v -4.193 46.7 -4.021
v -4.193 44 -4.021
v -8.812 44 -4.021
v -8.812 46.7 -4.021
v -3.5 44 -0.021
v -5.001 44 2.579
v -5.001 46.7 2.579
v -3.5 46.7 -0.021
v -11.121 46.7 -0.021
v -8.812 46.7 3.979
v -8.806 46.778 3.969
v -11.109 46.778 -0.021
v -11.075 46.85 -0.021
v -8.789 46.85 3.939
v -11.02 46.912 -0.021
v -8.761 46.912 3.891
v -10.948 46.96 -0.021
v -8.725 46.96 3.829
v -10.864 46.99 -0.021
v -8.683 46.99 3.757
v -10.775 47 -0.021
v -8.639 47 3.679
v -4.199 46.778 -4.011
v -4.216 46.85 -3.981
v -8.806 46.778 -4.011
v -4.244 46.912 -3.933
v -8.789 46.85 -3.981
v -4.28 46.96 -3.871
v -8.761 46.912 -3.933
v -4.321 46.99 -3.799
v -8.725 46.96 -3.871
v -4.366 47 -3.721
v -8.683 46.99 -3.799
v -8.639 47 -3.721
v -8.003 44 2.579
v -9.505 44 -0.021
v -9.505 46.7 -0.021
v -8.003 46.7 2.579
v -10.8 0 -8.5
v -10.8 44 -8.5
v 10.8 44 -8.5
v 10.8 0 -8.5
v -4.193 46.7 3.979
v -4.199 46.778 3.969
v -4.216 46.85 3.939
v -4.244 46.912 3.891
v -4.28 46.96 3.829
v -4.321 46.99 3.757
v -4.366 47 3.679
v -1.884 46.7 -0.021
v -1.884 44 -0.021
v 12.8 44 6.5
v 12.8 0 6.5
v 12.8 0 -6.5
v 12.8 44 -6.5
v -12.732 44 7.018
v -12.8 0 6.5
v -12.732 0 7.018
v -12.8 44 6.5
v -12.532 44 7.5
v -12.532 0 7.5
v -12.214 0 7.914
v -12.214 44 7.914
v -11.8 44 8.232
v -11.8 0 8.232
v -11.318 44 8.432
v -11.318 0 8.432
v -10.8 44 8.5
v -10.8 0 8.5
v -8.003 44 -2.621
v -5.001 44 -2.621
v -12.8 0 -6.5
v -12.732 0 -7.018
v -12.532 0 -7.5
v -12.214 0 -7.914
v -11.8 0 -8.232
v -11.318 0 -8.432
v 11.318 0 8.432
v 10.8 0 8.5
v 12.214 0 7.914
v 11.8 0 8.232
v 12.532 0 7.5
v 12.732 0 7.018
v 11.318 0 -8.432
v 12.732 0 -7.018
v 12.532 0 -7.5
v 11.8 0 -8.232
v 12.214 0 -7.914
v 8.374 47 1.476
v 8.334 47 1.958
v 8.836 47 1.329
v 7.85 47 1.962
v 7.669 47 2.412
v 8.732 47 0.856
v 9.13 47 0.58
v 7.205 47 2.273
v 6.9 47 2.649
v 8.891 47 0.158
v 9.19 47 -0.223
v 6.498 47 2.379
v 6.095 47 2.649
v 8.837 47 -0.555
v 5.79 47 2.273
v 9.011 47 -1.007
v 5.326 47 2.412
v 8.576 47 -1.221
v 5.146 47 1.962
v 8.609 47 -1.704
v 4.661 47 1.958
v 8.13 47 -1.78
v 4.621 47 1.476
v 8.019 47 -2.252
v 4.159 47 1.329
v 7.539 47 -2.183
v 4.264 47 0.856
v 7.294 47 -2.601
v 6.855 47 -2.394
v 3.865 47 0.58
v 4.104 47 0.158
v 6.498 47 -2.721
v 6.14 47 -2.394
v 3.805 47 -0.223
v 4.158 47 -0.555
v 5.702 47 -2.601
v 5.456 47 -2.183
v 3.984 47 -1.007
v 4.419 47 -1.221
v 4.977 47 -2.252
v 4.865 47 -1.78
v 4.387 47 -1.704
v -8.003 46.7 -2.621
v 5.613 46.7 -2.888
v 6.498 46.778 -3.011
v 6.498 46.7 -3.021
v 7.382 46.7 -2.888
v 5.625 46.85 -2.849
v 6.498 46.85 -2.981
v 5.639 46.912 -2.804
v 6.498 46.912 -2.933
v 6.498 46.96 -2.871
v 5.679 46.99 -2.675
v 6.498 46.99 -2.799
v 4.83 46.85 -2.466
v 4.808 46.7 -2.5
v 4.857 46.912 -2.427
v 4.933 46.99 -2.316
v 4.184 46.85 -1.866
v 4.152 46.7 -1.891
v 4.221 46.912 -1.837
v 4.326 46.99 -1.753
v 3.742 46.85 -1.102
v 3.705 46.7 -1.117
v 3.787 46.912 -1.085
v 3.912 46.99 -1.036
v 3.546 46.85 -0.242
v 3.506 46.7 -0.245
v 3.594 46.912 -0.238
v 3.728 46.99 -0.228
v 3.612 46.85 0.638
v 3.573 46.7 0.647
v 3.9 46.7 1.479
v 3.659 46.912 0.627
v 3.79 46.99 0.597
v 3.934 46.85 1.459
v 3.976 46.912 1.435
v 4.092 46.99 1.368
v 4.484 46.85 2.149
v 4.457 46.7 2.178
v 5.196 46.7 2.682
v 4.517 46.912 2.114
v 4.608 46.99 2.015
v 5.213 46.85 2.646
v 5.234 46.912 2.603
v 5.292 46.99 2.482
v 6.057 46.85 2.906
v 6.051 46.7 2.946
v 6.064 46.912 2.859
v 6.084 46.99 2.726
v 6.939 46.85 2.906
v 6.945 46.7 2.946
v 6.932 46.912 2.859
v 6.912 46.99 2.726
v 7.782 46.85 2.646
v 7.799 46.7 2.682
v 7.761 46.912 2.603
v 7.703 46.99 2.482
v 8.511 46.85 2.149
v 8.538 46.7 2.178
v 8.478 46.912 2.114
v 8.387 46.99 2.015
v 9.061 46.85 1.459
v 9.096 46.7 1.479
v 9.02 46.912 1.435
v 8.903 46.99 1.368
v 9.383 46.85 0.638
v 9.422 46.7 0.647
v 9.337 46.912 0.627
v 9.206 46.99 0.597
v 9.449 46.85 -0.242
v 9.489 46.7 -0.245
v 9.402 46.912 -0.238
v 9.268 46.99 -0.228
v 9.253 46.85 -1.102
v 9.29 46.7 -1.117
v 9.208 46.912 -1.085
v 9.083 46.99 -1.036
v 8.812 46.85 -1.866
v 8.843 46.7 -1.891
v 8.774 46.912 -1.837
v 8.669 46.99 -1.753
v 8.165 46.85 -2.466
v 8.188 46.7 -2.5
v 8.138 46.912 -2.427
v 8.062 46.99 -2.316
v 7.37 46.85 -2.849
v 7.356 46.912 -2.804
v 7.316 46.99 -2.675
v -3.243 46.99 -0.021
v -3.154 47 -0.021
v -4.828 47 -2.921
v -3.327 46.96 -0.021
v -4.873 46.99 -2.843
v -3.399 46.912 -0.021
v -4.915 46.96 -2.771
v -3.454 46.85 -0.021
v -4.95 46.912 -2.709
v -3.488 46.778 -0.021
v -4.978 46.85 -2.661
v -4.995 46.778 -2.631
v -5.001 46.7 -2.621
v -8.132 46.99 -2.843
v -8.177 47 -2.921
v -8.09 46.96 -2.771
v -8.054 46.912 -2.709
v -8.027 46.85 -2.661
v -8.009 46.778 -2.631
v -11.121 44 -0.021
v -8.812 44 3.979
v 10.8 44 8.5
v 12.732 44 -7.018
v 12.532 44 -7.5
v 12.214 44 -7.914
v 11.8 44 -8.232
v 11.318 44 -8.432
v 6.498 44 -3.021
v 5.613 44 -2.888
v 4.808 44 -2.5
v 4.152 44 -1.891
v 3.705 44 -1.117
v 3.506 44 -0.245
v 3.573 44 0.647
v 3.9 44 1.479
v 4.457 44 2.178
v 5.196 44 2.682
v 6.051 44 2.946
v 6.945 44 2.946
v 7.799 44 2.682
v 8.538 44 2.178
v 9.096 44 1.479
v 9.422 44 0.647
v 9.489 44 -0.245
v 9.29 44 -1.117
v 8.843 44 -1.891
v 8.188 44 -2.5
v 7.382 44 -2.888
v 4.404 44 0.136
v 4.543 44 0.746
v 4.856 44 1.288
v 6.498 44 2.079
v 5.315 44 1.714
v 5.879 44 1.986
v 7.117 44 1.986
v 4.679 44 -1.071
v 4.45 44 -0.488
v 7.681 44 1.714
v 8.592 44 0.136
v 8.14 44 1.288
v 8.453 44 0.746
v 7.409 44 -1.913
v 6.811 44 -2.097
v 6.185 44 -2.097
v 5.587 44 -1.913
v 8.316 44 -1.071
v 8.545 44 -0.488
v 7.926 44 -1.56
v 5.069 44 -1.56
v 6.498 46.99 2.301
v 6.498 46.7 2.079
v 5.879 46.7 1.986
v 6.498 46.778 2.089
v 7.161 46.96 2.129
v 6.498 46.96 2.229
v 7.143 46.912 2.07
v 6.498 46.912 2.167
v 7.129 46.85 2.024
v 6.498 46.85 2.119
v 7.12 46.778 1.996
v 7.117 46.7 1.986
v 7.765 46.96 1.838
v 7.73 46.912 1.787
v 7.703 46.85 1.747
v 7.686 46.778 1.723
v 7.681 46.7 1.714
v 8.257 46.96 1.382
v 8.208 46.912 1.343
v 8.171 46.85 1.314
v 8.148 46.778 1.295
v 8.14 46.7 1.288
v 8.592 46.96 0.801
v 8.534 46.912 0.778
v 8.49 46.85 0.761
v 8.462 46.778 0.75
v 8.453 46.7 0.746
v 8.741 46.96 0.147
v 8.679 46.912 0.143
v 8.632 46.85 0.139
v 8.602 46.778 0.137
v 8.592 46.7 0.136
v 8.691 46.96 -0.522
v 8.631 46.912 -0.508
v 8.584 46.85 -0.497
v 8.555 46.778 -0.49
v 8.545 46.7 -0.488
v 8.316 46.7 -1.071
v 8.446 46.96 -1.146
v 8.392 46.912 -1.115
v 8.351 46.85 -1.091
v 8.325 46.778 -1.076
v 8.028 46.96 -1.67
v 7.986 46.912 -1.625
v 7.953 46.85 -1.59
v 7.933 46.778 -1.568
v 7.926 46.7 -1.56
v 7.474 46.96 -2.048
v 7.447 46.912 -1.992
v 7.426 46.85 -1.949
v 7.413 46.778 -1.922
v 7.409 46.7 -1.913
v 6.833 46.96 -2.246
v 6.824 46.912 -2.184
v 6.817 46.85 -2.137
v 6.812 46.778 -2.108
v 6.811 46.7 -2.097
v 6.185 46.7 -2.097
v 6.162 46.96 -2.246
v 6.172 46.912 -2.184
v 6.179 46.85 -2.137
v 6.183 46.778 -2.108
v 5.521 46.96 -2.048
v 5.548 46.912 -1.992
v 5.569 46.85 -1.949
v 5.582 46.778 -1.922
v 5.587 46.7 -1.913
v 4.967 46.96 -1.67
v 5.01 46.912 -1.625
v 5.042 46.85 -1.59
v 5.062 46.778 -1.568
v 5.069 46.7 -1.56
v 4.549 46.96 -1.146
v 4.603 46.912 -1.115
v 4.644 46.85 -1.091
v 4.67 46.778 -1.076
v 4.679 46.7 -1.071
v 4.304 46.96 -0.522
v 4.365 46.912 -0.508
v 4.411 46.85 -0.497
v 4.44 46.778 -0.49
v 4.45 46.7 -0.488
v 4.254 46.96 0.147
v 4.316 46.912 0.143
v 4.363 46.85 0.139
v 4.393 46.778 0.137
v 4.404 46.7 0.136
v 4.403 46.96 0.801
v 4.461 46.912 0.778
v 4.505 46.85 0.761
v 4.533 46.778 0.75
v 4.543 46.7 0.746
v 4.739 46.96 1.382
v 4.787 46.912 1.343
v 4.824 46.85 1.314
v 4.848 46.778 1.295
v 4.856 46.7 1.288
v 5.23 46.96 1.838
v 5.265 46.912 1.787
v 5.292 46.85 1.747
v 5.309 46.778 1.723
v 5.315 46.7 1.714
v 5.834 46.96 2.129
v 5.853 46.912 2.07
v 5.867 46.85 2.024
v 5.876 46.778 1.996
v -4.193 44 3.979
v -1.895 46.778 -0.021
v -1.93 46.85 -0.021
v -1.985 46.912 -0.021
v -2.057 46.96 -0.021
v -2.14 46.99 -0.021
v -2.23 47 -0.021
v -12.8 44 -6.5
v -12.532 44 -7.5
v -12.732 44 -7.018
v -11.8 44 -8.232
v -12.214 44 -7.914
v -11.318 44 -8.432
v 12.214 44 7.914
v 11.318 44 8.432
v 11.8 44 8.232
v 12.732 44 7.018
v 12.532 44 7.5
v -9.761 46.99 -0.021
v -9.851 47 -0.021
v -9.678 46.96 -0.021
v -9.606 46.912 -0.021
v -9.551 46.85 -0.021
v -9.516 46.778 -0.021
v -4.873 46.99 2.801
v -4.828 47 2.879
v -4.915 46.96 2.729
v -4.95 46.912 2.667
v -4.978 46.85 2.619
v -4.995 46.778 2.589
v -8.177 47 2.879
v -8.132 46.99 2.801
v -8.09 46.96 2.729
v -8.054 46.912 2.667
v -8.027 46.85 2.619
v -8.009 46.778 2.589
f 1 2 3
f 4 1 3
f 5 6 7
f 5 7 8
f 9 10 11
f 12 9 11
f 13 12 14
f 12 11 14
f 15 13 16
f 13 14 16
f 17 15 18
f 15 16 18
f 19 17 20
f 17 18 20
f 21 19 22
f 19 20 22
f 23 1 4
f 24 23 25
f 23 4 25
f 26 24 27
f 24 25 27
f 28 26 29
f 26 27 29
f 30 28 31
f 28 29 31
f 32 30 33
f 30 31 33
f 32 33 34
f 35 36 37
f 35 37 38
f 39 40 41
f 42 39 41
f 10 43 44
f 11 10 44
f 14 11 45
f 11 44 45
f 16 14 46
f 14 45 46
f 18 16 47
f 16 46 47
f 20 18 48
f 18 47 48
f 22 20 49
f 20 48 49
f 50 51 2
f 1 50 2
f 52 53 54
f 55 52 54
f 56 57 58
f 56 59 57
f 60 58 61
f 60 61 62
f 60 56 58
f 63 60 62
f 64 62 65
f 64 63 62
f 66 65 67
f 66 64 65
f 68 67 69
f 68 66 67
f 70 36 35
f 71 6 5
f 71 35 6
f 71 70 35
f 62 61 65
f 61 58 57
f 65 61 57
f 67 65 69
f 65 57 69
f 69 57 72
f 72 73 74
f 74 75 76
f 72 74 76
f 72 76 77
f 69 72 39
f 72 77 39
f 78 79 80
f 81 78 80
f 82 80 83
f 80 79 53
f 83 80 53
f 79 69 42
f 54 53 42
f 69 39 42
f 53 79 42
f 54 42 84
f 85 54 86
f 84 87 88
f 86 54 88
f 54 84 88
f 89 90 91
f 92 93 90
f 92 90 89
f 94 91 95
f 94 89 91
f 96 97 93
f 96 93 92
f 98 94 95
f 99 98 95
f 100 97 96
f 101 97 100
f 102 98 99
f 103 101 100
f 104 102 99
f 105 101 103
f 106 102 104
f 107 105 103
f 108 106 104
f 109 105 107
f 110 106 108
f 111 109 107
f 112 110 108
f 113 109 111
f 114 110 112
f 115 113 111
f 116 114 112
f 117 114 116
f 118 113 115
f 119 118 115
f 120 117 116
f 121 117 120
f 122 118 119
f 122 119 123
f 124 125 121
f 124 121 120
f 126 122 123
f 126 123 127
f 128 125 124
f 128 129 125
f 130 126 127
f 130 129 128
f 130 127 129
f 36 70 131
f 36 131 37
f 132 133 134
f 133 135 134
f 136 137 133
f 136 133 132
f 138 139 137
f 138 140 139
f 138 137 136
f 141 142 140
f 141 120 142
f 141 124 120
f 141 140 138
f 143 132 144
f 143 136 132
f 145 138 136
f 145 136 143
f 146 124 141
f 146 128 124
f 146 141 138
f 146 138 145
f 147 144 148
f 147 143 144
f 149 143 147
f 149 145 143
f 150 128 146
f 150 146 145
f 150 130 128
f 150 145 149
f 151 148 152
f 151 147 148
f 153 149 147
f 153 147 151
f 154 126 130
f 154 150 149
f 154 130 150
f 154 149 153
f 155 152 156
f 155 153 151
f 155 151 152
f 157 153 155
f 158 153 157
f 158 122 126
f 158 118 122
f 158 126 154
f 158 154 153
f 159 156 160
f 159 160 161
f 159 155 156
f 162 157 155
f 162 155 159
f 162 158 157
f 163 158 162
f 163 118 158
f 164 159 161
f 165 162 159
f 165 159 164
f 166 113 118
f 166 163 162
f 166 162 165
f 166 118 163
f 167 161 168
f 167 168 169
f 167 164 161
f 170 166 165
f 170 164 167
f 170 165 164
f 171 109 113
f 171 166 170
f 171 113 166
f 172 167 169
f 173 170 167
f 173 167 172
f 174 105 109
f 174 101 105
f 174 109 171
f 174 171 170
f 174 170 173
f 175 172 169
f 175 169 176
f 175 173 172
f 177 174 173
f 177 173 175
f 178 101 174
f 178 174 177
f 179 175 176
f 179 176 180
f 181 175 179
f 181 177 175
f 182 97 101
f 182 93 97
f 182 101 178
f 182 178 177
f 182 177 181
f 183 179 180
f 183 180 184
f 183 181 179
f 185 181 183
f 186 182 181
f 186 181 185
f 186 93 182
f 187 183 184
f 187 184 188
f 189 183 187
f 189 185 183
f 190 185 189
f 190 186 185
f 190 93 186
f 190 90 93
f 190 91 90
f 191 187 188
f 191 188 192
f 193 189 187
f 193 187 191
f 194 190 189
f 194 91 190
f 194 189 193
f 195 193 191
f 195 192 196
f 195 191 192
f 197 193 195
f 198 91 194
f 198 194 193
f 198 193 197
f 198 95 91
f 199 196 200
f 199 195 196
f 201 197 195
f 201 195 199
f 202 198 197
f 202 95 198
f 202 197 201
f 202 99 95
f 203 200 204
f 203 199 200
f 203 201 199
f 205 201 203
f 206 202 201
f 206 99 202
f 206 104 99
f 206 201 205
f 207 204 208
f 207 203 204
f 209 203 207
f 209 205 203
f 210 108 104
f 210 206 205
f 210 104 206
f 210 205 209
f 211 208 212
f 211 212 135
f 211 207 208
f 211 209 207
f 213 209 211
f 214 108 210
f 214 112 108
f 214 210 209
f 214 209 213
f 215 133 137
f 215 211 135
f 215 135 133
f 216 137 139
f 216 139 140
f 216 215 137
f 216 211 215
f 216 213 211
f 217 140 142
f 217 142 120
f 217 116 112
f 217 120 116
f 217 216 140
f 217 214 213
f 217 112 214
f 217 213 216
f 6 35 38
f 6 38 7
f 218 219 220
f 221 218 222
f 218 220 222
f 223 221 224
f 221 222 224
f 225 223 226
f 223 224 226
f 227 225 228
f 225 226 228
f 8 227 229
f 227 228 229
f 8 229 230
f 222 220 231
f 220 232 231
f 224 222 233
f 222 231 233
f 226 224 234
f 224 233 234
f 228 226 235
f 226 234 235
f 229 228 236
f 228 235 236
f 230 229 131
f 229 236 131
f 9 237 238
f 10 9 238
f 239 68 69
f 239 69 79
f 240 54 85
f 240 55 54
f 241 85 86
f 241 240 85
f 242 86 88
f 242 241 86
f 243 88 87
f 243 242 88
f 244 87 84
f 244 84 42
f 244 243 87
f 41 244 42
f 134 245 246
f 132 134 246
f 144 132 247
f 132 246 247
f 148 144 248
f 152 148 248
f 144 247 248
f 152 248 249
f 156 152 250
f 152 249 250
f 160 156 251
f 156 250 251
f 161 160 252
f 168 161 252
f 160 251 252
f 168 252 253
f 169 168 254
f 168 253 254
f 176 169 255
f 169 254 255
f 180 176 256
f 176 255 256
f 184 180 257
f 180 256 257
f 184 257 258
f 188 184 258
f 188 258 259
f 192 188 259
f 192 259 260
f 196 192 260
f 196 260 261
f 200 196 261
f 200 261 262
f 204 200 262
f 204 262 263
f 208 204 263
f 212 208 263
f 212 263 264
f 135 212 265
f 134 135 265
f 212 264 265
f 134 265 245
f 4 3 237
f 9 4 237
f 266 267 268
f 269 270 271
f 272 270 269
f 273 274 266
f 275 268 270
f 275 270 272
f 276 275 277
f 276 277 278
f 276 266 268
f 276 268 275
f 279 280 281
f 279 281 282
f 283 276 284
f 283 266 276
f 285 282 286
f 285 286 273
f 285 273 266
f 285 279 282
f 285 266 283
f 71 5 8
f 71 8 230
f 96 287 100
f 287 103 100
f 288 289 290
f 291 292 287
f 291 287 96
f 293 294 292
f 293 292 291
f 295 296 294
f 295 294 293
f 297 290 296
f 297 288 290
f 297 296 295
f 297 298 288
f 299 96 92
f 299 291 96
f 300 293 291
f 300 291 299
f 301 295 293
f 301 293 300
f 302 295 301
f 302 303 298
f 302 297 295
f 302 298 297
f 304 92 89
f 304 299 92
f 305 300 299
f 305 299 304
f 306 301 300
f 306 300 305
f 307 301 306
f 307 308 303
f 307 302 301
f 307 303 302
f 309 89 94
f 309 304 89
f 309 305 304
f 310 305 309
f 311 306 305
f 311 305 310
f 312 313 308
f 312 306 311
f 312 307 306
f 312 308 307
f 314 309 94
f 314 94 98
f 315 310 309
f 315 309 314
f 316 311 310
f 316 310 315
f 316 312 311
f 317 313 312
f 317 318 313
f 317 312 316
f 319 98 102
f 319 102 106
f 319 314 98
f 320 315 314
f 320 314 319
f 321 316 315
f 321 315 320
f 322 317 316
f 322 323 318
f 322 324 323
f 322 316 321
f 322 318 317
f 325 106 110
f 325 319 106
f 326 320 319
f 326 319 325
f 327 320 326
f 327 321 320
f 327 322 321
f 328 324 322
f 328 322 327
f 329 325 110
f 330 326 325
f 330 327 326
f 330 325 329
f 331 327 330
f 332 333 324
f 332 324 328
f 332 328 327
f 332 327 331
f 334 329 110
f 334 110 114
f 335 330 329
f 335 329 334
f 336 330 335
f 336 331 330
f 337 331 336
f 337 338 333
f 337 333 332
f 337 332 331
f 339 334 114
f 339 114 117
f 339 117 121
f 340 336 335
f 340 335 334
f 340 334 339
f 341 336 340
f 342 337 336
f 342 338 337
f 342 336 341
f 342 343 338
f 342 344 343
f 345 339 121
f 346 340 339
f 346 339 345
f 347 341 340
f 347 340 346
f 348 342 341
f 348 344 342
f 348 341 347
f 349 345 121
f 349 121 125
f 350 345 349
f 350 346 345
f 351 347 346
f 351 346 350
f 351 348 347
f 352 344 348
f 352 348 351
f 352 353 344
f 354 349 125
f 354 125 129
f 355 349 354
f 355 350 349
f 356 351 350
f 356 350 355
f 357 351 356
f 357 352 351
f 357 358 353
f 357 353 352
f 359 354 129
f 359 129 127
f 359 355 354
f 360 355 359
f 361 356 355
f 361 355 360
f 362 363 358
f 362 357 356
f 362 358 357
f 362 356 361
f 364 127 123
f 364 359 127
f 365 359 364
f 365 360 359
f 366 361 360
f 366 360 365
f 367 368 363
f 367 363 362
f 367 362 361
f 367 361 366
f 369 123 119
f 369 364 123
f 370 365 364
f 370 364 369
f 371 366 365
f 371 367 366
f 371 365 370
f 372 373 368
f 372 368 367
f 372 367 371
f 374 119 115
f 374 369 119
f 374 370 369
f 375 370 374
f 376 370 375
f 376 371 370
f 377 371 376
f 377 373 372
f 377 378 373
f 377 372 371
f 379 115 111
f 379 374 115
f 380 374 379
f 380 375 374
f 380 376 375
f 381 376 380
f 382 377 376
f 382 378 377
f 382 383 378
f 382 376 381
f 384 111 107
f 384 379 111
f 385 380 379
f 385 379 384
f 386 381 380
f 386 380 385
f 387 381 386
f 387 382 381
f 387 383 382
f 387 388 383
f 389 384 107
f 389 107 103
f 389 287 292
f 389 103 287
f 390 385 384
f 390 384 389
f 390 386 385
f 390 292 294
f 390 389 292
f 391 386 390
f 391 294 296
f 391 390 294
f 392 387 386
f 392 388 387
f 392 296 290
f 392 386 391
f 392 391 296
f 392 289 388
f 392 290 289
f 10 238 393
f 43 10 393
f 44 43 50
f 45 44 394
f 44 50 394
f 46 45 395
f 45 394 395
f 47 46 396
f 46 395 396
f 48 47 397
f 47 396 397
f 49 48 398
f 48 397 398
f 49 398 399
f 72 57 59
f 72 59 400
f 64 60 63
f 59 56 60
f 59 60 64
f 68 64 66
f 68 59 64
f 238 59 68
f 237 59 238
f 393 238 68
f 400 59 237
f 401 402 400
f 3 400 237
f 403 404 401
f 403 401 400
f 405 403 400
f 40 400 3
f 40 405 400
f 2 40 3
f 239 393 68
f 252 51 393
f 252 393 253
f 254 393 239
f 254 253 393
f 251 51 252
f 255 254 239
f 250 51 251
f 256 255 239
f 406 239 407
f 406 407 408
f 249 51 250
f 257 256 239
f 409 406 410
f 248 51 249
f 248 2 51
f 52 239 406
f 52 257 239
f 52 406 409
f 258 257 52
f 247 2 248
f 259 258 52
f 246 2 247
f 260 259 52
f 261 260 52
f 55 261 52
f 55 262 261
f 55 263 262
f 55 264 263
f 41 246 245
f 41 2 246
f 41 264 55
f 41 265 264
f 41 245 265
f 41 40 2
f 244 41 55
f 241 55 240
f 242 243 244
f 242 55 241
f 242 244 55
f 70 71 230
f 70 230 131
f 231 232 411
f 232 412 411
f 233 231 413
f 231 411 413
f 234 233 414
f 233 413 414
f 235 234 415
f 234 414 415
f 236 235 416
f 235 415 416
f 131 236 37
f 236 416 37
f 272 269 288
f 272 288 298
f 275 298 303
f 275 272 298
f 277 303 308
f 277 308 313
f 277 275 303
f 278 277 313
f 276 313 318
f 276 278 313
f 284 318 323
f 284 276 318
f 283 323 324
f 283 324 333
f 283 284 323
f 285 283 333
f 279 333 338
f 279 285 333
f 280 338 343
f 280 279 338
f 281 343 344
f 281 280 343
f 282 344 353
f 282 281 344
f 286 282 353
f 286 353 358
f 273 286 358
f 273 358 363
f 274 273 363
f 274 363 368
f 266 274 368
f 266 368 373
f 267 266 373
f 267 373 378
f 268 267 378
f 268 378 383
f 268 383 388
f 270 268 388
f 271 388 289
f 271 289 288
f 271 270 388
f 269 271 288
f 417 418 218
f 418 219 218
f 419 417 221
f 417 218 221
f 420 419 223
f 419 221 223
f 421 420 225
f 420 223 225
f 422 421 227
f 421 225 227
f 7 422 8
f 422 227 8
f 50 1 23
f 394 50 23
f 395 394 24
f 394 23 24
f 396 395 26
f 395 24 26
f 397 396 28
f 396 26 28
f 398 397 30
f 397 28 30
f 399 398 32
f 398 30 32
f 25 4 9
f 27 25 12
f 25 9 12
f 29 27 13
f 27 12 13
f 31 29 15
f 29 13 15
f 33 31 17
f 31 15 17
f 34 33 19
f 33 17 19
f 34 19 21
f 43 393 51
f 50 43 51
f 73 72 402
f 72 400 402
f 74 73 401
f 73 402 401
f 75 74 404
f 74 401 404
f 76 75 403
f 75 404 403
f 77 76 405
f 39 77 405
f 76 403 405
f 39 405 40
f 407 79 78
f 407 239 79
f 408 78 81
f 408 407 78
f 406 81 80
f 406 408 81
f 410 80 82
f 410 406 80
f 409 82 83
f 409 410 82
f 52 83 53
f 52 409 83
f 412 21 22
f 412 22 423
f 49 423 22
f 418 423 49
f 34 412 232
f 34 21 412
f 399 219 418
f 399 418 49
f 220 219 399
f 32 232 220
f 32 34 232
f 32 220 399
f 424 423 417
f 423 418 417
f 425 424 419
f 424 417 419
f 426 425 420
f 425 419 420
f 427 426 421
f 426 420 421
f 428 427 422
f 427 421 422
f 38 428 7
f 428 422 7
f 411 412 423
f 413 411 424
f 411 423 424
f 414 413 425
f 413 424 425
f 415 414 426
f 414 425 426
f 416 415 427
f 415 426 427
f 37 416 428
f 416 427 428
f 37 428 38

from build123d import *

# Parameters (mm, degrees)
SKETCH_1_W      = 25.6
SKETCH_1_H      = 17
EXTRUDE_1_DEPTH = 44
FILLET_1_R      = 2
SKETCH_2_R      = 3
SKETCH_2_R_2    = 2.1
EXTRUDE_2_DEPTH = 3
FILLET_2_R      = 0.3


with BuildPart() as part:
    # Эскиз1 → Бобышка-Вытянуть1 (new body)
    with BuildSketch(Plane(origin=(0, 0, 0), x_dir=(1, 0, 0), z_dir=(0, 1, 0))):
        Rectangle(SKETCH_1_W, SKETCH_1_H)
    extrude(amount=EXTRUDE_1_DEPTH)

    # Скругление1
    fillet_1_edges = [part.edges().sort_by_distance(p)[0] for p in [
        (12.8, 22, 8.5),
        (-12.8, 22, 8.5),
        (-12.8, 22, -8.5),
        (12.8, 22, -8.5),
    ]]
    fillet(fillet_1_edges, radius=FILLET_1_R)

    # Эскиз2 → Бобышка-Вытянуть2 (add)
    # profile 1 of 2: a face of its own
    with BuildSketch(Plane(origin=(0, 44, 0), x_dir=(1, 0, 0), z_dir=(0, 1, 0))):
        with Locations(Location((6.497670016, 0.020872179, 0), (0, 0, 90))):
            Circle(SKETCH_2_R)
        with Locations(Location((6.497670016, 0.020872179, 0), (0, 0, 270))):
            Circle(SKETCH_2_R_2, mode=Mode.SUBTRACT)
    # profile 2 of 2: a face of its own
    with BuildSketch(Plane(origin=(0, 44, 0), x_dir=(1, 0, 0), z_dir=(0, 1, 0))):
        Polygon((-1.883527831, 0.020872179), (-4.192928907, 4.020872179), (-8.811731061, 4.020872179), (-11.121132138, 0.020872179), (-8.811731061, -3.979127821), (-4.192928907, -3.979127821), align=None)
        Polygon((-3.500108584, 0.020872179), (-5.001219284, 2.620872179), (-8.003440684, 2.620872179), (-9.504551384, 0.020872179), (-8.003440684, -2.579127821), (-5.001219284, -2.579127821), align=None, mode=Mode.SUBTRACT)
    extrude(amount=EXTRUDE_2_DEPTH)

    # Скругление2
    fillet_2_edges = [part.edges().sort_by_distance(p)[0] for p in [
        (6.497670016, 47, 2.979127821),
        (6.497670016, 47, -2.120872179),
        (-3.038228369, 47, 1.979127821),
        (-3.038228369, 47, -2.020872179),
        (-6.502329984, 47, -4.020872179),
        (-9.966431599, 47, -2.020872179),
        (-9.966431599, 47, 1.979127821),
        (-6.502329984, 47, 3.979127821),
        (-4.250663934, 47, 1.279127821),
        (-4.250663934, 47, -1.320872179),
        (-6.502329984, 47, -2.620872179),
        (-8.753996034, 47, -1.320872179),
        (-8.753996034, 47, 1.279127821),
        (-6.502329984, 47, 2.579127821),
    ]]
    fillet(fillet_2_edges, radius=FILLET_2_R)


solid = part.part
